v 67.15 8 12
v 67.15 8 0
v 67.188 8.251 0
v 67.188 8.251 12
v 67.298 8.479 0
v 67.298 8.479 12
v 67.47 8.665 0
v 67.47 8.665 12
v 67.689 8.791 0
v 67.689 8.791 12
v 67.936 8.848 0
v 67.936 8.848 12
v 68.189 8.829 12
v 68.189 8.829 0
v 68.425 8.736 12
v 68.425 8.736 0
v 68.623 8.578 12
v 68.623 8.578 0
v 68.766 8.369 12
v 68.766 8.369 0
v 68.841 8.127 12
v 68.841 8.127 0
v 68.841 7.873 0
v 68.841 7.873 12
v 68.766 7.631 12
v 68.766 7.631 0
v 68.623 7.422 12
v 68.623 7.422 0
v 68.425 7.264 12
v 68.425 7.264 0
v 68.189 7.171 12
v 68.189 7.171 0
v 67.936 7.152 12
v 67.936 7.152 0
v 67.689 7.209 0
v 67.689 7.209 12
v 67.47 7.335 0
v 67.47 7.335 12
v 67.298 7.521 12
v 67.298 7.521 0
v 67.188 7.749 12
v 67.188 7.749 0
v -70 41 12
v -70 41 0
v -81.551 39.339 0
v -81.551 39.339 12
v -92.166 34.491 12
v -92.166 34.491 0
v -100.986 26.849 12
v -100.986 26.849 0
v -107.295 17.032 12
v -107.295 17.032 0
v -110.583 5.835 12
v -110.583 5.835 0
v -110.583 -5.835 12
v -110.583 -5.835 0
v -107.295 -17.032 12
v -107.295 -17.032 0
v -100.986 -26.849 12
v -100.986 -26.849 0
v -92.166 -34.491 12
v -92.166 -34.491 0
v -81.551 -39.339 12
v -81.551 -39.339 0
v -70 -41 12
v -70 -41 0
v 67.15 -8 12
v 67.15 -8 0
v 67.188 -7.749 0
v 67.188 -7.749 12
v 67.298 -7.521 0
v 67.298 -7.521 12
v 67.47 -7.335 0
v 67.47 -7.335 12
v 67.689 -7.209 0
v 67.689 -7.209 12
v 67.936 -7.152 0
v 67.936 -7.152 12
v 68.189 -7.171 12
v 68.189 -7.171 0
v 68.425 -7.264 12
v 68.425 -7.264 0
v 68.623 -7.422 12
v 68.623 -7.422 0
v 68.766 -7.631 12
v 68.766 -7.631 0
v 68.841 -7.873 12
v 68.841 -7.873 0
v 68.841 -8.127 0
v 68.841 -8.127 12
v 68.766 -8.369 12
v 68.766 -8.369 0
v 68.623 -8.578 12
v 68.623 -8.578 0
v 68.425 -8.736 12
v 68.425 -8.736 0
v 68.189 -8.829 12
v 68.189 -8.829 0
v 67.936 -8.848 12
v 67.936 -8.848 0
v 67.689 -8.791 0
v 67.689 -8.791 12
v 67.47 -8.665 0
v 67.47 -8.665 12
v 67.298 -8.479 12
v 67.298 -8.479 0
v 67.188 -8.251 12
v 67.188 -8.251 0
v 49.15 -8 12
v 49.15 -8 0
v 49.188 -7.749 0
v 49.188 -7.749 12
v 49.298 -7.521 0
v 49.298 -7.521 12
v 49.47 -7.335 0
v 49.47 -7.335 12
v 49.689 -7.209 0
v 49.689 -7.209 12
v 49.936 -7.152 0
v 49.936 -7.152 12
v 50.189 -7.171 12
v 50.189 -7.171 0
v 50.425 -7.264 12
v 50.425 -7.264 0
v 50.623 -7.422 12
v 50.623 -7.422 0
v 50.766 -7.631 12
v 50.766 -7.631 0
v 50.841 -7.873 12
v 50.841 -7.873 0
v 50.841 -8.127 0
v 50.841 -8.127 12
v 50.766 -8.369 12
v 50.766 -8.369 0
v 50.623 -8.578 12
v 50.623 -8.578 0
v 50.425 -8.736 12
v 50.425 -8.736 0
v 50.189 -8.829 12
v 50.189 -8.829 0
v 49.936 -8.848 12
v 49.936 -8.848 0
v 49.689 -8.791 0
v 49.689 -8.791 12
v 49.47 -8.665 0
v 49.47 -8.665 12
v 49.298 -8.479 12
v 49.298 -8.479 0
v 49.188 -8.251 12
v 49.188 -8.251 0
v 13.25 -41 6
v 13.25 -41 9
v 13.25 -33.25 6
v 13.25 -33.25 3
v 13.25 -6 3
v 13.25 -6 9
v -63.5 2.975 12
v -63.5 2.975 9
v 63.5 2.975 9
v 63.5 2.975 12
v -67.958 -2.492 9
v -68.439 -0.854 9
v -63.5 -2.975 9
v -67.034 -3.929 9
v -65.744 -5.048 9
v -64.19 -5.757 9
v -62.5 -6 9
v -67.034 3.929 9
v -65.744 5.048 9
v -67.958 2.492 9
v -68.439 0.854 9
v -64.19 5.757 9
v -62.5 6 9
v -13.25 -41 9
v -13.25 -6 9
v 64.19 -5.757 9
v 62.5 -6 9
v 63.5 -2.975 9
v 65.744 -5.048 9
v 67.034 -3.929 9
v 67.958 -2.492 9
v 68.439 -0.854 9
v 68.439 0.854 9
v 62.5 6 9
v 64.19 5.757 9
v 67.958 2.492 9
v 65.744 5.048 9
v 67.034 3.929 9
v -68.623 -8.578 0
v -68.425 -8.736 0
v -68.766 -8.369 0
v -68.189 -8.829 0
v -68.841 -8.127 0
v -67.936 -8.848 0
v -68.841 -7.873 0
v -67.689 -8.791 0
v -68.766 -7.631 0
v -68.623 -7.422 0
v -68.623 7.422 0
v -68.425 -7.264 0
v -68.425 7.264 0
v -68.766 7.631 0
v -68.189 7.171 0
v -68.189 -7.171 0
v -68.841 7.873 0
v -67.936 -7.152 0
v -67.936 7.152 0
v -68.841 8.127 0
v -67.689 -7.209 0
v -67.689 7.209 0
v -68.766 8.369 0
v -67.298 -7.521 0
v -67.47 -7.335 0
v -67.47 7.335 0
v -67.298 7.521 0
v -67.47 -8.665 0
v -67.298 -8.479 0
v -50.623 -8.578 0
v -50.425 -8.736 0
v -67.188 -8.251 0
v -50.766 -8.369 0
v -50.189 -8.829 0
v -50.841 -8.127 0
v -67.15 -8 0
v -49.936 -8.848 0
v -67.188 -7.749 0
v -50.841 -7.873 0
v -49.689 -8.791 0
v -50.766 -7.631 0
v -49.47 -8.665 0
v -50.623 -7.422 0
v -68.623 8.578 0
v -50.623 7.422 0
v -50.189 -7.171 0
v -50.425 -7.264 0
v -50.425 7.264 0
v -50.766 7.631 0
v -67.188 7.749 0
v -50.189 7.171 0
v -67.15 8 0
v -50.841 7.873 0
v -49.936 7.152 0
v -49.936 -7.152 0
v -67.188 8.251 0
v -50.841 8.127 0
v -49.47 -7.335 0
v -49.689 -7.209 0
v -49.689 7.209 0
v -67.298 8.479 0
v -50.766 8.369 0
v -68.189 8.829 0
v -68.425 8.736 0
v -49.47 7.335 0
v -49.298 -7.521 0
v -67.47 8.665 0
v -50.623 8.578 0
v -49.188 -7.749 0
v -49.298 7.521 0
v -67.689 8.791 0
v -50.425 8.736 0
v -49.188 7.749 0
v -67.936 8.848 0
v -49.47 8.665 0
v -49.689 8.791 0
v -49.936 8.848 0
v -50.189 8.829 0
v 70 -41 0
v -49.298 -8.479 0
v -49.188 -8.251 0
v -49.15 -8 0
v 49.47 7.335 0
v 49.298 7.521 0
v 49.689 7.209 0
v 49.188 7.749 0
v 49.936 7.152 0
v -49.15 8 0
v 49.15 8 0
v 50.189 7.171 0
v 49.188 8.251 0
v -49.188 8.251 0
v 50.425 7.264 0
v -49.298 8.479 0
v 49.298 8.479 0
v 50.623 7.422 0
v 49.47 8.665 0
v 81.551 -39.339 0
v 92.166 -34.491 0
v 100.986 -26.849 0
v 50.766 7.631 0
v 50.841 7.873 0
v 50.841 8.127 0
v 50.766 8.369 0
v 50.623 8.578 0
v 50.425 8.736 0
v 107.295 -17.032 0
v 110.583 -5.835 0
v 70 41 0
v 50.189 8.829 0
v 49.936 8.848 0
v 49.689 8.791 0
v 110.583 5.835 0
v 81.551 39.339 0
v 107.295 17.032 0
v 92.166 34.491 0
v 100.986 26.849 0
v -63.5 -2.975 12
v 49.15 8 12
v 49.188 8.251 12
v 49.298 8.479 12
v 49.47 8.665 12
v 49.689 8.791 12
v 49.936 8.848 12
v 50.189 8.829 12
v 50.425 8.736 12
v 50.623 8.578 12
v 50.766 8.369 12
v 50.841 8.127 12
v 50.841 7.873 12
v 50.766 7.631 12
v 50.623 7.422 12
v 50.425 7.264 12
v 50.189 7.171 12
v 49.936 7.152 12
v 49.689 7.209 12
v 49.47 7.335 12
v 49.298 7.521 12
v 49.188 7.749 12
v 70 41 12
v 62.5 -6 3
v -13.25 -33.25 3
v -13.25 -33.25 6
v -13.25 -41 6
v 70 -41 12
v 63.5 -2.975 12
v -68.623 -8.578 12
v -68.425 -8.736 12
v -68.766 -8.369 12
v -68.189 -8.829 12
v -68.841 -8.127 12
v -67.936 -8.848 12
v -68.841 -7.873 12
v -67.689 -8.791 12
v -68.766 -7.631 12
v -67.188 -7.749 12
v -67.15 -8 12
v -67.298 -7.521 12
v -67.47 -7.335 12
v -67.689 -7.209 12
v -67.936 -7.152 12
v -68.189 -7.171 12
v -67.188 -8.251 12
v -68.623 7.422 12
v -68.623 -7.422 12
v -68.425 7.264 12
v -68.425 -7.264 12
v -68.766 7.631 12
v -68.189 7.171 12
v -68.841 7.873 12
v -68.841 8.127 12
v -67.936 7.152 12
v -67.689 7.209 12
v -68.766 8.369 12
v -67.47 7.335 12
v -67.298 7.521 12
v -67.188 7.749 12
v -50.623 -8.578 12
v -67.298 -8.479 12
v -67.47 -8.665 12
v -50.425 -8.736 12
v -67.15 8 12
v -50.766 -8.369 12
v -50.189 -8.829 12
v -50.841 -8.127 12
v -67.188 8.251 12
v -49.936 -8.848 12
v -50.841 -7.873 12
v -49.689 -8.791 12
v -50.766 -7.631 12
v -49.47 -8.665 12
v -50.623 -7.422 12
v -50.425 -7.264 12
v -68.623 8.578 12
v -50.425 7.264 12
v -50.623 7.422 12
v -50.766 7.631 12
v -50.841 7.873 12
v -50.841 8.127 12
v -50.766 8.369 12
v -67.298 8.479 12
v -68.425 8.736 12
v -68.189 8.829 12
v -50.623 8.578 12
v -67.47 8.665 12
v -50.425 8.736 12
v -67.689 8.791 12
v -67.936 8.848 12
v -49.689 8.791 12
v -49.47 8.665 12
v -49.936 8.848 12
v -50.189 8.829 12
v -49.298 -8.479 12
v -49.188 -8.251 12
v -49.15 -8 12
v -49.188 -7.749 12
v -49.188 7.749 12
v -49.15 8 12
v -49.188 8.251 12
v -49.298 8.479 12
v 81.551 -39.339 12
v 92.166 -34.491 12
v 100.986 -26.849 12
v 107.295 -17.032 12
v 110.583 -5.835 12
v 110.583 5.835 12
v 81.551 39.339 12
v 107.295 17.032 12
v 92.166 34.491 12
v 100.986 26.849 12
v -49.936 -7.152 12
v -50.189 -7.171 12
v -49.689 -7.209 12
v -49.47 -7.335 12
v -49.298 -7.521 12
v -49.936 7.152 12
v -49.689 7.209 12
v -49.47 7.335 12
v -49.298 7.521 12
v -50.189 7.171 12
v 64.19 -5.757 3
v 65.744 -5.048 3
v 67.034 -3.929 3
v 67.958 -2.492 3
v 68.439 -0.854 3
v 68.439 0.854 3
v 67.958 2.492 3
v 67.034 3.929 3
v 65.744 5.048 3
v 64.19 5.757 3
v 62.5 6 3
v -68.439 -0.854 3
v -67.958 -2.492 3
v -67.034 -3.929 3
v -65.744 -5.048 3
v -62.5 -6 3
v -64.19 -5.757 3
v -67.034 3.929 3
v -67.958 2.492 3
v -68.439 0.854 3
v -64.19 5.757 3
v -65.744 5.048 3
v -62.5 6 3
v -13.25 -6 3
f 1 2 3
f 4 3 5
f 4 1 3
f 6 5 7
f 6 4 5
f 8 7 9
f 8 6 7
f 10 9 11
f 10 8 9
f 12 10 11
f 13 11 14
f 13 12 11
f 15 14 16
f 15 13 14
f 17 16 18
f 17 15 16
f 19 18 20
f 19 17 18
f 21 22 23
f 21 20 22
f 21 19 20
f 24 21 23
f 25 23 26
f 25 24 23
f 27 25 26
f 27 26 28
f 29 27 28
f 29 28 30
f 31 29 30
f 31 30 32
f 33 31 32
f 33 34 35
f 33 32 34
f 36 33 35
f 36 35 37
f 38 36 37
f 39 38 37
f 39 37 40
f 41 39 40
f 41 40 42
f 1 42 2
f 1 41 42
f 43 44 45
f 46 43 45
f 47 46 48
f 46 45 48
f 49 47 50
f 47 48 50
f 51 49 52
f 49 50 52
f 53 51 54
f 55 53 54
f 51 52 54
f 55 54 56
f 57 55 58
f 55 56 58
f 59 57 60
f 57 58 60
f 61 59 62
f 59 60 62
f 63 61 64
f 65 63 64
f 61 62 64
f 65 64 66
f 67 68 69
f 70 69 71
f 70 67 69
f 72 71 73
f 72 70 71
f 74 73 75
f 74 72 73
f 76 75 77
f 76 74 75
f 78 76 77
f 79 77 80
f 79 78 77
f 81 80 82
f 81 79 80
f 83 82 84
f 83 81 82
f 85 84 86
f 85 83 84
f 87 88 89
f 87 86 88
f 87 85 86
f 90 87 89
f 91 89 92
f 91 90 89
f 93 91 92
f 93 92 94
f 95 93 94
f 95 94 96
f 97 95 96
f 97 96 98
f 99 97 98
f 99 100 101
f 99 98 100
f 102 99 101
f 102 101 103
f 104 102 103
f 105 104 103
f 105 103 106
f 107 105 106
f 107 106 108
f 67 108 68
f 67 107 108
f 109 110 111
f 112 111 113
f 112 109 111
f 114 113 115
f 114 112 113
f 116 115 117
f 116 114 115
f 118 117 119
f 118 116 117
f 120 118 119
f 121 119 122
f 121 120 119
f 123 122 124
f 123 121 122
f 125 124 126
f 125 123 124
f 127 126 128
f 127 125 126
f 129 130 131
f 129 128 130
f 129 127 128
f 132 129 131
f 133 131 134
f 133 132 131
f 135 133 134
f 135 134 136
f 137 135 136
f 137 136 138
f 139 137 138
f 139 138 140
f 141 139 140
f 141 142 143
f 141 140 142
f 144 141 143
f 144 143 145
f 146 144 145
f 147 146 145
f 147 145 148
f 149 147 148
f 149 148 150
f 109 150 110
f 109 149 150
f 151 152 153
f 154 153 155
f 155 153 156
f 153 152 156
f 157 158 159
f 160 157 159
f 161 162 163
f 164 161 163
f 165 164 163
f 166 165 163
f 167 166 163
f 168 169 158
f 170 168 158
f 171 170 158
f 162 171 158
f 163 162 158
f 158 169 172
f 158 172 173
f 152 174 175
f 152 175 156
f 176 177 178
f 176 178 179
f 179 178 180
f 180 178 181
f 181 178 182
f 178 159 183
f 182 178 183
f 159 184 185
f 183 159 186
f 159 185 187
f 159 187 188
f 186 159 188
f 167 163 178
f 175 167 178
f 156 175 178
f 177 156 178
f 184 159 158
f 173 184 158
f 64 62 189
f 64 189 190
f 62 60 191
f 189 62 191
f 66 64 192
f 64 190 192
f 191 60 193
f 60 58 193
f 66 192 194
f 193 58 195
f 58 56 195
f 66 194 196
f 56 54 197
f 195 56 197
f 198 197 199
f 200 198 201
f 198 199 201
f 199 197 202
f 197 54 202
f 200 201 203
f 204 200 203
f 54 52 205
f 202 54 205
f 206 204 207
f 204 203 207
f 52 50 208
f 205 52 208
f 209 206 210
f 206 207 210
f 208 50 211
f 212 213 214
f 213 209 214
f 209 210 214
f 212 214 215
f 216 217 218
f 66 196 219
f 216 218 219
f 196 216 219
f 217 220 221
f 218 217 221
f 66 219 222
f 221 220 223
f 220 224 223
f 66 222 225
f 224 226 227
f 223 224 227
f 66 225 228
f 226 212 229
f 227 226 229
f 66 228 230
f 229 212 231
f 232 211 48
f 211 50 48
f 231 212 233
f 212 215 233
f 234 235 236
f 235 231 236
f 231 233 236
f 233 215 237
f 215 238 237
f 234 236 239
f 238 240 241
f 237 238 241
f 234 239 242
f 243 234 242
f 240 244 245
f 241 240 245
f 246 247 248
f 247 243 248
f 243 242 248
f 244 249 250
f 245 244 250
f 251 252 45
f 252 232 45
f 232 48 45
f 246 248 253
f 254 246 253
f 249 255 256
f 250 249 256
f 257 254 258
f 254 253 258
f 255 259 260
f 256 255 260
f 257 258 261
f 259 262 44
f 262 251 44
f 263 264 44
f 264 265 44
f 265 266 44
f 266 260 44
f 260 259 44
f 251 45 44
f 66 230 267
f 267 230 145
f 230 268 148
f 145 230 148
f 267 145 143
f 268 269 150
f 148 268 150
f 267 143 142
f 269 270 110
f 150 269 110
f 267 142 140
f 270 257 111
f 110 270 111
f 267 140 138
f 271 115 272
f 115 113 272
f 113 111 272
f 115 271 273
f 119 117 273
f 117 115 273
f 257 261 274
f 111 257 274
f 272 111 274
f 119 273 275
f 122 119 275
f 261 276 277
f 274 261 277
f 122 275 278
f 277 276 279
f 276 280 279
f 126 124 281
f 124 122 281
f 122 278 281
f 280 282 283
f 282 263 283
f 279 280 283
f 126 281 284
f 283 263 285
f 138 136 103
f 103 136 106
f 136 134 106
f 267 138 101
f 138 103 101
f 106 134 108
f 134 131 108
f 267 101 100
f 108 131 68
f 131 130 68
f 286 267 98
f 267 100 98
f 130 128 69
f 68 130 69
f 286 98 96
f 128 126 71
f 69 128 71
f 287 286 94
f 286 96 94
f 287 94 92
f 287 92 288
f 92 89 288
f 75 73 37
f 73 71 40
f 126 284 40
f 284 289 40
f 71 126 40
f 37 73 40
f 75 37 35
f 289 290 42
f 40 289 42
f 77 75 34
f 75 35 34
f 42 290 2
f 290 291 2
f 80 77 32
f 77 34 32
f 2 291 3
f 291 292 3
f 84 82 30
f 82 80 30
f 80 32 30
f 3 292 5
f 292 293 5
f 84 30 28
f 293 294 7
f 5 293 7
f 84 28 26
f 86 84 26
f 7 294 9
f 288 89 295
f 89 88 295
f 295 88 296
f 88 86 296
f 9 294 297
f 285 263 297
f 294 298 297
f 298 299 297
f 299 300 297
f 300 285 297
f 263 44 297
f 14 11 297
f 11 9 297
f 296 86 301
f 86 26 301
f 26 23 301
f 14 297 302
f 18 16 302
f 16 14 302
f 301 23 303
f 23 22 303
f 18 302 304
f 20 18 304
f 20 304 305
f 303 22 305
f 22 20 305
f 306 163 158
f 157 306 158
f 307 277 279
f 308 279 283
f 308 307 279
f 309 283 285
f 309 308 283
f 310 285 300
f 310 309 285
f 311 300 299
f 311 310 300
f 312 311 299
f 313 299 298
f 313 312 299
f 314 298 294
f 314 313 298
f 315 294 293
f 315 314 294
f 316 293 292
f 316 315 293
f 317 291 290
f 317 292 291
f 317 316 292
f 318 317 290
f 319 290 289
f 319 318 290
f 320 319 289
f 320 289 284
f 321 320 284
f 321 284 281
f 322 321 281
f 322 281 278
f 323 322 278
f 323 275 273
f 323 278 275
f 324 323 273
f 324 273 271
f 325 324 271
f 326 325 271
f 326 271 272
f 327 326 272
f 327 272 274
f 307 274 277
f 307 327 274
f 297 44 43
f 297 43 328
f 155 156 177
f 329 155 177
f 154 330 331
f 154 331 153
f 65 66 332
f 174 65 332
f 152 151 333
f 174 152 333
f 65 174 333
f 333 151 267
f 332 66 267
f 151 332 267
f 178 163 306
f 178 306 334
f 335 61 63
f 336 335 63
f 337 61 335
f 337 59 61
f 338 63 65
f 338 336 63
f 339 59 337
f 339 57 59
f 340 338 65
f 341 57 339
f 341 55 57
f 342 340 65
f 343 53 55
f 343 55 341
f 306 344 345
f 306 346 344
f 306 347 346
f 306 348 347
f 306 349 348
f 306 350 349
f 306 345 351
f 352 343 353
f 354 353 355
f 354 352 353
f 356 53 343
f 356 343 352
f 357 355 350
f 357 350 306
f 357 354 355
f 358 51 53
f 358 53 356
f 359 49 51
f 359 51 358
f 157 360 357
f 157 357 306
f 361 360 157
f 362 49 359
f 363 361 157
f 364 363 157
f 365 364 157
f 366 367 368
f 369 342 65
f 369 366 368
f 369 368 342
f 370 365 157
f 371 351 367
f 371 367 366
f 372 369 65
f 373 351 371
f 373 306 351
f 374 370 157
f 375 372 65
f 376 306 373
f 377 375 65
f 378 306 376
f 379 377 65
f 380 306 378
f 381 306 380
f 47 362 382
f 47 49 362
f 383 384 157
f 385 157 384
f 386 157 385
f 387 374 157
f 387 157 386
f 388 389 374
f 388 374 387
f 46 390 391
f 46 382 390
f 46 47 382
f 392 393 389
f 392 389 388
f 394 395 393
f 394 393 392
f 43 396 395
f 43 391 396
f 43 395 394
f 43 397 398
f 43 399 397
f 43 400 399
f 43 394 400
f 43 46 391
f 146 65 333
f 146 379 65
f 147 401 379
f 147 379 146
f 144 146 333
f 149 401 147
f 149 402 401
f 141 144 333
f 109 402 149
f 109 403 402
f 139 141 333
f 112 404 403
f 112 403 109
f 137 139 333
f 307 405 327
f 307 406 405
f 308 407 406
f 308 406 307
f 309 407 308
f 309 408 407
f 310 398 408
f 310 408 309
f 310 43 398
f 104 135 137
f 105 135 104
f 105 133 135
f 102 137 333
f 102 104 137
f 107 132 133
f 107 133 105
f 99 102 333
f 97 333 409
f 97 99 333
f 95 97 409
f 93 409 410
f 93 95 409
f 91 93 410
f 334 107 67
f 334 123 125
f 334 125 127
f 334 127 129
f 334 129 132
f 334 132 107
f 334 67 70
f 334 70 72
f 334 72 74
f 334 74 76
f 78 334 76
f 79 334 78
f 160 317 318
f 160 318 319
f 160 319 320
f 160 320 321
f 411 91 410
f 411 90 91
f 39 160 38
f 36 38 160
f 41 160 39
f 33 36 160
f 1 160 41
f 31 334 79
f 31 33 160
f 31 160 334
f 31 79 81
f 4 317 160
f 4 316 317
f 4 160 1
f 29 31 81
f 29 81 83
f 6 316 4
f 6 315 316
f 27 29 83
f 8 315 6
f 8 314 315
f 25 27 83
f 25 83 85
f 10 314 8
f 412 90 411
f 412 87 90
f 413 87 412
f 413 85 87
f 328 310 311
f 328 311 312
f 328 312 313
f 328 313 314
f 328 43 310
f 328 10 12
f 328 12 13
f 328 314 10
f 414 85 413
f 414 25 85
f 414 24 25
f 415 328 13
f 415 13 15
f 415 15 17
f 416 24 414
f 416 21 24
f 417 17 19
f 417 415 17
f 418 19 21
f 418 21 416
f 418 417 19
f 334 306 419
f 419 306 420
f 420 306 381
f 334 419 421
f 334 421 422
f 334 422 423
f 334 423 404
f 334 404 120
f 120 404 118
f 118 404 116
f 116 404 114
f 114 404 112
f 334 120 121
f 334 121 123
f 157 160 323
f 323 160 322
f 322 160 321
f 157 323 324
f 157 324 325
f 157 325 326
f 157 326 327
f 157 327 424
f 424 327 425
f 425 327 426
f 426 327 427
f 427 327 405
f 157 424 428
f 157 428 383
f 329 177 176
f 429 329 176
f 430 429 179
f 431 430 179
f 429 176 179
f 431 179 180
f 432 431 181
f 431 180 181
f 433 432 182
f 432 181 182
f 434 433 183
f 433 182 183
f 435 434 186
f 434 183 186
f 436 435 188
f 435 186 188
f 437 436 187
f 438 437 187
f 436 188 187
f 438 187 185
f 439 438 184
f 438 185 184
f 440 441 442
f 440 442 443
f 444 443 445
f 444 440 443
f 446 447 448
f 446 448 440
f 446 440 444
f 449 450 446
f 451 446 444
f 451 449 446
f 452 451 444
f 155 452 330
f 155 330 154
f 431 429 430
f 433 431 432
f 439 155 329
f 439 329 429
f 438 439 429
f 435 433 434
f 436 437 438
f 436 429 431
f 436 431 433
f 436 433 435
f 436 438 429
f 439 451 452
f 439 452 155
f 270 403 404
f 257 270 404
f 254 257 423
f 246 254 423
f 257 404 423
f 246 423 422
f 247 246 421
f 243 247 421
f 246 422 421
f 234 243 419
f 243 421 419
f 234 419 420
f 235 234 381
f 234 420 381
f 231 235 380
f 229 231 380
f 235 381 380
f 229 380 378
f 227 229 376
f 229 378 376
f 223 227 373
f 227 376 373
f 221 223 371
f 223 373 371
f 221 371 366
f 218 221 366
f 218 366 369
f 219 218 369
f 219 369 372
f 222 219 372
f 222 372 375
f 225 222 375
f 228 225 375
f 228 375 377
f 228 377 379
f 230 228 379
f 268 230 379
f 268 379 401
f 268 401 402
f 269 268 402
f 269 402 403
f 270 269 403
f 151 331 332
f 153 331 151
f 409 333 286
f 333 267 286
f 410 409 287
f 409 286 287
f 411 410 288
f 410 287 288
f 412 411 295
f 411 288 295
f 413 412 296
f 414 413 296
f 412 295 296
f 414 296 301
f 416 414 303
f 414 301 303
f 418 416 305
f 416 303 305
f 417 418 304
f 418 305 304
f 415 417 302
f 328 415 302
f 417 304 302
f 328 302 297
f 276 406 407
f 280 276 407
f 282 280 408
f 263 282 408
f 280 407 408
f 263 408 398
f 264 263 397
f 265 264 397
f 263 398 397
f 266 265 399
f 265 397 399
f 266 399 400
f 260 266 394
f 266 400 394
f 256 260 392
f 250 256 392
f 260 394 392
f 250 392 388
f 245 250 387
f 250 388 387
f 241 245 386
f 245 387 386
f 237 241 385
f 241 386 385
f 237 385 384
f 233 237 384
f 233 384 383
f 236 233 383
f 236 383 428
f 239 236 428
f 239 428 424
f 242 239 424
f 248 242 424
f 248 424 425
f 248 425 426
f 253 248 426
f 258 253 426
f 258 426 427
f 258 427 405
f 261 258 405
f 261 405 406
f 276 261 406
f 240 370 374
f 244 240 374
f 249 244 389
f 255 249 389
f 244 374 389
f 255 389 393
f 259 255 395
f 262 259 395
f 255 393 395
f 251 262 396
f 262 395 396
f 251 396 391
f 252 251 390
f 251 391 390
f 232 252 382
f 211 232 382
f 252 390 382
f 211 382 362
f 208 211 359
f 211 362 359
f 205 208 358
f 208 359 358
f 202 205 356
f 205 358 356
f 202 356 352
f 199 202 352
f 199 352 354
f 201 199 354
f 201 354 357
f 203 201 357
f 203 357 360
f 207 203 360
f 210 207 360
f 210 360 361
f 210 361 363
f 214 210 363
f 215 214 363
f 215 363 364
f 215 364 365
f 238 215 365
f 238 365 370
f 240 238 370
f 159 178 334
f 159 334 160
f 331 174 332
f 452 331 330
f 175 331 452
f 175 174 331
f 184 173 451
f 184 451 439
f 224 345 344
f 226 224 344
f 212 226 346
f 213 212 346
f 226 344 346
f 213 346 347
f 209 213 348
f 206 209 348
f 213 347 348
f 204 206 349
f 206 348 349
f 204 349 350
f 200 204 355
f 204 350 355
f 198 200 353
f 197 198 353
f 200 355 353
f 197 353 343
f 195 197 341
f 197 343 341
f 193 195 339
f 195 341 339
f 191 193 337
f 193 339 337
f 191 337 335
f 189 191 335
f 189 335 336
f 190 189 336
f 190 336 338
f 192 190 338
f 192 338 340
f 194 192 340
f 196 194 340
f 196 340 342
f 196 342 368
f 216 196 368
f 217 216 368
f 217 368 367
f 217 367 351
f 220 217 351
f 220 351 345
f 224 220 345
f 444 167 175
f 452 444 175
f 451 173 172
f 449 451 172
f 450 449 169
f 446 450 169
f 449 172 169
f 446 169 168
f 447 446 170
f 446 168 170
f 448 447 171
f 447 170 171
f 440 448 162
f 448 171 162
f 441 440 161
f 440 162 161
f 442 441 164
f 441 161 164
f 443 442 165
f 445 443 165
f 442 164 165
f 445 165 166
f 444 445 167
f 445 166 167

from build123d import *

# Parameters (mm, degrees)
PAD_DEPTH       = 9
POCKET_DEPTH    = 6
SKETCH002_W     = 26.5
SKETCH002_H     = 35
POCKET001_DEPTH = 6
SKETCH003_W     = 127
SKETCH003_H     = 5.95
PAD001_DEPTH    = 3
SKETCH004_R     = 0.85
POCKET002_DEPTH = 485.929265
SKETCH005_W     = 26.5
SKETCH005_H     = 7.75
PAD002_DEPTH    = 3


with BuildPart() as part:
    # Sketch → Pad (new body)
    with BuildSketch(Plane.XY):
        with BuildLine():
            ThreePointArc((-70, 41), (-111, 0), (-70, -41))
            Line((-70, -41), (70, -41))
            ThreePointArc((70, -41), (111, 0), (70, 41))
            Line((-70, 41), (70, 41))
        make_face()
    extrude(amount=PAD_DEPTH)

    # Sketch001 (on Face6 of Pad) → Pocket (cut)
    with BuildSketch(Plane.XY.offset(9)):
        with BuildLine():
            ThreePointArc((-62.5, 6), (-68.5, 0), (-62.5, -6))
            Line((-62.5, -6), (62.5, -6))
            ThreePointArc((62.5, -6), (68.5, 0), (62.5, 6))
            Line((-62.5, 6), (62.5, 6))
        make_face()
    extrude(amount=-POCKET_DEPTH, mode=Mode.SUBTRACT)

    # Sketch002 (on Face5 of Pocket) → Pocket001 (cut)
    with BuildSketch(Plane.XY.offset(9)):
        with Locations((0, -23.5)):
            Rectangle(SKETCH002_W, SKETCH002_H)
    extrude(amount=-POCKET001_DEPTH, mode=Mode.SUBTRACT)

    # Sketch003 (on Face5 of Pocket001) → Pad001 (join)
    with BuildSketch(Plane.XY.offset(9)):
        with BuildLine():
            ThreePointArc((-70, 41), (-111, 0), (-70, -41))
            Line((-70, -41), (70, -41))
            ThreePointArc((70, -41), (111, 0), (70, 41))
            Line((-70, 41), (70, 41))
        make_face()
        Rectangle(SKETCH003_W, SKETCH003_H, mode=Mode.SUBTRACT)
    extrude(amount=PAD001_DEPTH)

    # Sketch004 (on Face12 of Pad001) → Pocket002 (cut, through all)
    with BuildSketch(Plane.XY.offset(12)):
        with Locations((-68, -8)):
            Circle(SKETCH004_R)
        with Locations((-50, -8)):
            Circle(SKETCH004_R)
        with Locations((-50, 8)):
            Circle(SKETCH004_R)
        with Locations((-68, 8)):
            Circle(SKETCH004_R)
    pocket002 = extrude(amount=-POCKET002_DEPTH, mode=Mode.SUBTRACT)

    # Sketch005 (on Face10 of Pocket002) → Pad002 (join)
    with BuildSketch(Plane.XY.offset(3)):
        with Locations((0, -37.125)):
            Rectangle(SKETCH005_W, SKETCH005_H)
    extrude(amount=PAD002_DEPTH)

    # Mirrored: Pocket002 across Sketch004 V_Axis
    add(pocket002.mirror(Plane(origin=(0, 0, 12), x_dir=(0, 0, 1), z_dir=(1, 0, 0))), mode=Mode.SUBTRACT)


solid = part.part
